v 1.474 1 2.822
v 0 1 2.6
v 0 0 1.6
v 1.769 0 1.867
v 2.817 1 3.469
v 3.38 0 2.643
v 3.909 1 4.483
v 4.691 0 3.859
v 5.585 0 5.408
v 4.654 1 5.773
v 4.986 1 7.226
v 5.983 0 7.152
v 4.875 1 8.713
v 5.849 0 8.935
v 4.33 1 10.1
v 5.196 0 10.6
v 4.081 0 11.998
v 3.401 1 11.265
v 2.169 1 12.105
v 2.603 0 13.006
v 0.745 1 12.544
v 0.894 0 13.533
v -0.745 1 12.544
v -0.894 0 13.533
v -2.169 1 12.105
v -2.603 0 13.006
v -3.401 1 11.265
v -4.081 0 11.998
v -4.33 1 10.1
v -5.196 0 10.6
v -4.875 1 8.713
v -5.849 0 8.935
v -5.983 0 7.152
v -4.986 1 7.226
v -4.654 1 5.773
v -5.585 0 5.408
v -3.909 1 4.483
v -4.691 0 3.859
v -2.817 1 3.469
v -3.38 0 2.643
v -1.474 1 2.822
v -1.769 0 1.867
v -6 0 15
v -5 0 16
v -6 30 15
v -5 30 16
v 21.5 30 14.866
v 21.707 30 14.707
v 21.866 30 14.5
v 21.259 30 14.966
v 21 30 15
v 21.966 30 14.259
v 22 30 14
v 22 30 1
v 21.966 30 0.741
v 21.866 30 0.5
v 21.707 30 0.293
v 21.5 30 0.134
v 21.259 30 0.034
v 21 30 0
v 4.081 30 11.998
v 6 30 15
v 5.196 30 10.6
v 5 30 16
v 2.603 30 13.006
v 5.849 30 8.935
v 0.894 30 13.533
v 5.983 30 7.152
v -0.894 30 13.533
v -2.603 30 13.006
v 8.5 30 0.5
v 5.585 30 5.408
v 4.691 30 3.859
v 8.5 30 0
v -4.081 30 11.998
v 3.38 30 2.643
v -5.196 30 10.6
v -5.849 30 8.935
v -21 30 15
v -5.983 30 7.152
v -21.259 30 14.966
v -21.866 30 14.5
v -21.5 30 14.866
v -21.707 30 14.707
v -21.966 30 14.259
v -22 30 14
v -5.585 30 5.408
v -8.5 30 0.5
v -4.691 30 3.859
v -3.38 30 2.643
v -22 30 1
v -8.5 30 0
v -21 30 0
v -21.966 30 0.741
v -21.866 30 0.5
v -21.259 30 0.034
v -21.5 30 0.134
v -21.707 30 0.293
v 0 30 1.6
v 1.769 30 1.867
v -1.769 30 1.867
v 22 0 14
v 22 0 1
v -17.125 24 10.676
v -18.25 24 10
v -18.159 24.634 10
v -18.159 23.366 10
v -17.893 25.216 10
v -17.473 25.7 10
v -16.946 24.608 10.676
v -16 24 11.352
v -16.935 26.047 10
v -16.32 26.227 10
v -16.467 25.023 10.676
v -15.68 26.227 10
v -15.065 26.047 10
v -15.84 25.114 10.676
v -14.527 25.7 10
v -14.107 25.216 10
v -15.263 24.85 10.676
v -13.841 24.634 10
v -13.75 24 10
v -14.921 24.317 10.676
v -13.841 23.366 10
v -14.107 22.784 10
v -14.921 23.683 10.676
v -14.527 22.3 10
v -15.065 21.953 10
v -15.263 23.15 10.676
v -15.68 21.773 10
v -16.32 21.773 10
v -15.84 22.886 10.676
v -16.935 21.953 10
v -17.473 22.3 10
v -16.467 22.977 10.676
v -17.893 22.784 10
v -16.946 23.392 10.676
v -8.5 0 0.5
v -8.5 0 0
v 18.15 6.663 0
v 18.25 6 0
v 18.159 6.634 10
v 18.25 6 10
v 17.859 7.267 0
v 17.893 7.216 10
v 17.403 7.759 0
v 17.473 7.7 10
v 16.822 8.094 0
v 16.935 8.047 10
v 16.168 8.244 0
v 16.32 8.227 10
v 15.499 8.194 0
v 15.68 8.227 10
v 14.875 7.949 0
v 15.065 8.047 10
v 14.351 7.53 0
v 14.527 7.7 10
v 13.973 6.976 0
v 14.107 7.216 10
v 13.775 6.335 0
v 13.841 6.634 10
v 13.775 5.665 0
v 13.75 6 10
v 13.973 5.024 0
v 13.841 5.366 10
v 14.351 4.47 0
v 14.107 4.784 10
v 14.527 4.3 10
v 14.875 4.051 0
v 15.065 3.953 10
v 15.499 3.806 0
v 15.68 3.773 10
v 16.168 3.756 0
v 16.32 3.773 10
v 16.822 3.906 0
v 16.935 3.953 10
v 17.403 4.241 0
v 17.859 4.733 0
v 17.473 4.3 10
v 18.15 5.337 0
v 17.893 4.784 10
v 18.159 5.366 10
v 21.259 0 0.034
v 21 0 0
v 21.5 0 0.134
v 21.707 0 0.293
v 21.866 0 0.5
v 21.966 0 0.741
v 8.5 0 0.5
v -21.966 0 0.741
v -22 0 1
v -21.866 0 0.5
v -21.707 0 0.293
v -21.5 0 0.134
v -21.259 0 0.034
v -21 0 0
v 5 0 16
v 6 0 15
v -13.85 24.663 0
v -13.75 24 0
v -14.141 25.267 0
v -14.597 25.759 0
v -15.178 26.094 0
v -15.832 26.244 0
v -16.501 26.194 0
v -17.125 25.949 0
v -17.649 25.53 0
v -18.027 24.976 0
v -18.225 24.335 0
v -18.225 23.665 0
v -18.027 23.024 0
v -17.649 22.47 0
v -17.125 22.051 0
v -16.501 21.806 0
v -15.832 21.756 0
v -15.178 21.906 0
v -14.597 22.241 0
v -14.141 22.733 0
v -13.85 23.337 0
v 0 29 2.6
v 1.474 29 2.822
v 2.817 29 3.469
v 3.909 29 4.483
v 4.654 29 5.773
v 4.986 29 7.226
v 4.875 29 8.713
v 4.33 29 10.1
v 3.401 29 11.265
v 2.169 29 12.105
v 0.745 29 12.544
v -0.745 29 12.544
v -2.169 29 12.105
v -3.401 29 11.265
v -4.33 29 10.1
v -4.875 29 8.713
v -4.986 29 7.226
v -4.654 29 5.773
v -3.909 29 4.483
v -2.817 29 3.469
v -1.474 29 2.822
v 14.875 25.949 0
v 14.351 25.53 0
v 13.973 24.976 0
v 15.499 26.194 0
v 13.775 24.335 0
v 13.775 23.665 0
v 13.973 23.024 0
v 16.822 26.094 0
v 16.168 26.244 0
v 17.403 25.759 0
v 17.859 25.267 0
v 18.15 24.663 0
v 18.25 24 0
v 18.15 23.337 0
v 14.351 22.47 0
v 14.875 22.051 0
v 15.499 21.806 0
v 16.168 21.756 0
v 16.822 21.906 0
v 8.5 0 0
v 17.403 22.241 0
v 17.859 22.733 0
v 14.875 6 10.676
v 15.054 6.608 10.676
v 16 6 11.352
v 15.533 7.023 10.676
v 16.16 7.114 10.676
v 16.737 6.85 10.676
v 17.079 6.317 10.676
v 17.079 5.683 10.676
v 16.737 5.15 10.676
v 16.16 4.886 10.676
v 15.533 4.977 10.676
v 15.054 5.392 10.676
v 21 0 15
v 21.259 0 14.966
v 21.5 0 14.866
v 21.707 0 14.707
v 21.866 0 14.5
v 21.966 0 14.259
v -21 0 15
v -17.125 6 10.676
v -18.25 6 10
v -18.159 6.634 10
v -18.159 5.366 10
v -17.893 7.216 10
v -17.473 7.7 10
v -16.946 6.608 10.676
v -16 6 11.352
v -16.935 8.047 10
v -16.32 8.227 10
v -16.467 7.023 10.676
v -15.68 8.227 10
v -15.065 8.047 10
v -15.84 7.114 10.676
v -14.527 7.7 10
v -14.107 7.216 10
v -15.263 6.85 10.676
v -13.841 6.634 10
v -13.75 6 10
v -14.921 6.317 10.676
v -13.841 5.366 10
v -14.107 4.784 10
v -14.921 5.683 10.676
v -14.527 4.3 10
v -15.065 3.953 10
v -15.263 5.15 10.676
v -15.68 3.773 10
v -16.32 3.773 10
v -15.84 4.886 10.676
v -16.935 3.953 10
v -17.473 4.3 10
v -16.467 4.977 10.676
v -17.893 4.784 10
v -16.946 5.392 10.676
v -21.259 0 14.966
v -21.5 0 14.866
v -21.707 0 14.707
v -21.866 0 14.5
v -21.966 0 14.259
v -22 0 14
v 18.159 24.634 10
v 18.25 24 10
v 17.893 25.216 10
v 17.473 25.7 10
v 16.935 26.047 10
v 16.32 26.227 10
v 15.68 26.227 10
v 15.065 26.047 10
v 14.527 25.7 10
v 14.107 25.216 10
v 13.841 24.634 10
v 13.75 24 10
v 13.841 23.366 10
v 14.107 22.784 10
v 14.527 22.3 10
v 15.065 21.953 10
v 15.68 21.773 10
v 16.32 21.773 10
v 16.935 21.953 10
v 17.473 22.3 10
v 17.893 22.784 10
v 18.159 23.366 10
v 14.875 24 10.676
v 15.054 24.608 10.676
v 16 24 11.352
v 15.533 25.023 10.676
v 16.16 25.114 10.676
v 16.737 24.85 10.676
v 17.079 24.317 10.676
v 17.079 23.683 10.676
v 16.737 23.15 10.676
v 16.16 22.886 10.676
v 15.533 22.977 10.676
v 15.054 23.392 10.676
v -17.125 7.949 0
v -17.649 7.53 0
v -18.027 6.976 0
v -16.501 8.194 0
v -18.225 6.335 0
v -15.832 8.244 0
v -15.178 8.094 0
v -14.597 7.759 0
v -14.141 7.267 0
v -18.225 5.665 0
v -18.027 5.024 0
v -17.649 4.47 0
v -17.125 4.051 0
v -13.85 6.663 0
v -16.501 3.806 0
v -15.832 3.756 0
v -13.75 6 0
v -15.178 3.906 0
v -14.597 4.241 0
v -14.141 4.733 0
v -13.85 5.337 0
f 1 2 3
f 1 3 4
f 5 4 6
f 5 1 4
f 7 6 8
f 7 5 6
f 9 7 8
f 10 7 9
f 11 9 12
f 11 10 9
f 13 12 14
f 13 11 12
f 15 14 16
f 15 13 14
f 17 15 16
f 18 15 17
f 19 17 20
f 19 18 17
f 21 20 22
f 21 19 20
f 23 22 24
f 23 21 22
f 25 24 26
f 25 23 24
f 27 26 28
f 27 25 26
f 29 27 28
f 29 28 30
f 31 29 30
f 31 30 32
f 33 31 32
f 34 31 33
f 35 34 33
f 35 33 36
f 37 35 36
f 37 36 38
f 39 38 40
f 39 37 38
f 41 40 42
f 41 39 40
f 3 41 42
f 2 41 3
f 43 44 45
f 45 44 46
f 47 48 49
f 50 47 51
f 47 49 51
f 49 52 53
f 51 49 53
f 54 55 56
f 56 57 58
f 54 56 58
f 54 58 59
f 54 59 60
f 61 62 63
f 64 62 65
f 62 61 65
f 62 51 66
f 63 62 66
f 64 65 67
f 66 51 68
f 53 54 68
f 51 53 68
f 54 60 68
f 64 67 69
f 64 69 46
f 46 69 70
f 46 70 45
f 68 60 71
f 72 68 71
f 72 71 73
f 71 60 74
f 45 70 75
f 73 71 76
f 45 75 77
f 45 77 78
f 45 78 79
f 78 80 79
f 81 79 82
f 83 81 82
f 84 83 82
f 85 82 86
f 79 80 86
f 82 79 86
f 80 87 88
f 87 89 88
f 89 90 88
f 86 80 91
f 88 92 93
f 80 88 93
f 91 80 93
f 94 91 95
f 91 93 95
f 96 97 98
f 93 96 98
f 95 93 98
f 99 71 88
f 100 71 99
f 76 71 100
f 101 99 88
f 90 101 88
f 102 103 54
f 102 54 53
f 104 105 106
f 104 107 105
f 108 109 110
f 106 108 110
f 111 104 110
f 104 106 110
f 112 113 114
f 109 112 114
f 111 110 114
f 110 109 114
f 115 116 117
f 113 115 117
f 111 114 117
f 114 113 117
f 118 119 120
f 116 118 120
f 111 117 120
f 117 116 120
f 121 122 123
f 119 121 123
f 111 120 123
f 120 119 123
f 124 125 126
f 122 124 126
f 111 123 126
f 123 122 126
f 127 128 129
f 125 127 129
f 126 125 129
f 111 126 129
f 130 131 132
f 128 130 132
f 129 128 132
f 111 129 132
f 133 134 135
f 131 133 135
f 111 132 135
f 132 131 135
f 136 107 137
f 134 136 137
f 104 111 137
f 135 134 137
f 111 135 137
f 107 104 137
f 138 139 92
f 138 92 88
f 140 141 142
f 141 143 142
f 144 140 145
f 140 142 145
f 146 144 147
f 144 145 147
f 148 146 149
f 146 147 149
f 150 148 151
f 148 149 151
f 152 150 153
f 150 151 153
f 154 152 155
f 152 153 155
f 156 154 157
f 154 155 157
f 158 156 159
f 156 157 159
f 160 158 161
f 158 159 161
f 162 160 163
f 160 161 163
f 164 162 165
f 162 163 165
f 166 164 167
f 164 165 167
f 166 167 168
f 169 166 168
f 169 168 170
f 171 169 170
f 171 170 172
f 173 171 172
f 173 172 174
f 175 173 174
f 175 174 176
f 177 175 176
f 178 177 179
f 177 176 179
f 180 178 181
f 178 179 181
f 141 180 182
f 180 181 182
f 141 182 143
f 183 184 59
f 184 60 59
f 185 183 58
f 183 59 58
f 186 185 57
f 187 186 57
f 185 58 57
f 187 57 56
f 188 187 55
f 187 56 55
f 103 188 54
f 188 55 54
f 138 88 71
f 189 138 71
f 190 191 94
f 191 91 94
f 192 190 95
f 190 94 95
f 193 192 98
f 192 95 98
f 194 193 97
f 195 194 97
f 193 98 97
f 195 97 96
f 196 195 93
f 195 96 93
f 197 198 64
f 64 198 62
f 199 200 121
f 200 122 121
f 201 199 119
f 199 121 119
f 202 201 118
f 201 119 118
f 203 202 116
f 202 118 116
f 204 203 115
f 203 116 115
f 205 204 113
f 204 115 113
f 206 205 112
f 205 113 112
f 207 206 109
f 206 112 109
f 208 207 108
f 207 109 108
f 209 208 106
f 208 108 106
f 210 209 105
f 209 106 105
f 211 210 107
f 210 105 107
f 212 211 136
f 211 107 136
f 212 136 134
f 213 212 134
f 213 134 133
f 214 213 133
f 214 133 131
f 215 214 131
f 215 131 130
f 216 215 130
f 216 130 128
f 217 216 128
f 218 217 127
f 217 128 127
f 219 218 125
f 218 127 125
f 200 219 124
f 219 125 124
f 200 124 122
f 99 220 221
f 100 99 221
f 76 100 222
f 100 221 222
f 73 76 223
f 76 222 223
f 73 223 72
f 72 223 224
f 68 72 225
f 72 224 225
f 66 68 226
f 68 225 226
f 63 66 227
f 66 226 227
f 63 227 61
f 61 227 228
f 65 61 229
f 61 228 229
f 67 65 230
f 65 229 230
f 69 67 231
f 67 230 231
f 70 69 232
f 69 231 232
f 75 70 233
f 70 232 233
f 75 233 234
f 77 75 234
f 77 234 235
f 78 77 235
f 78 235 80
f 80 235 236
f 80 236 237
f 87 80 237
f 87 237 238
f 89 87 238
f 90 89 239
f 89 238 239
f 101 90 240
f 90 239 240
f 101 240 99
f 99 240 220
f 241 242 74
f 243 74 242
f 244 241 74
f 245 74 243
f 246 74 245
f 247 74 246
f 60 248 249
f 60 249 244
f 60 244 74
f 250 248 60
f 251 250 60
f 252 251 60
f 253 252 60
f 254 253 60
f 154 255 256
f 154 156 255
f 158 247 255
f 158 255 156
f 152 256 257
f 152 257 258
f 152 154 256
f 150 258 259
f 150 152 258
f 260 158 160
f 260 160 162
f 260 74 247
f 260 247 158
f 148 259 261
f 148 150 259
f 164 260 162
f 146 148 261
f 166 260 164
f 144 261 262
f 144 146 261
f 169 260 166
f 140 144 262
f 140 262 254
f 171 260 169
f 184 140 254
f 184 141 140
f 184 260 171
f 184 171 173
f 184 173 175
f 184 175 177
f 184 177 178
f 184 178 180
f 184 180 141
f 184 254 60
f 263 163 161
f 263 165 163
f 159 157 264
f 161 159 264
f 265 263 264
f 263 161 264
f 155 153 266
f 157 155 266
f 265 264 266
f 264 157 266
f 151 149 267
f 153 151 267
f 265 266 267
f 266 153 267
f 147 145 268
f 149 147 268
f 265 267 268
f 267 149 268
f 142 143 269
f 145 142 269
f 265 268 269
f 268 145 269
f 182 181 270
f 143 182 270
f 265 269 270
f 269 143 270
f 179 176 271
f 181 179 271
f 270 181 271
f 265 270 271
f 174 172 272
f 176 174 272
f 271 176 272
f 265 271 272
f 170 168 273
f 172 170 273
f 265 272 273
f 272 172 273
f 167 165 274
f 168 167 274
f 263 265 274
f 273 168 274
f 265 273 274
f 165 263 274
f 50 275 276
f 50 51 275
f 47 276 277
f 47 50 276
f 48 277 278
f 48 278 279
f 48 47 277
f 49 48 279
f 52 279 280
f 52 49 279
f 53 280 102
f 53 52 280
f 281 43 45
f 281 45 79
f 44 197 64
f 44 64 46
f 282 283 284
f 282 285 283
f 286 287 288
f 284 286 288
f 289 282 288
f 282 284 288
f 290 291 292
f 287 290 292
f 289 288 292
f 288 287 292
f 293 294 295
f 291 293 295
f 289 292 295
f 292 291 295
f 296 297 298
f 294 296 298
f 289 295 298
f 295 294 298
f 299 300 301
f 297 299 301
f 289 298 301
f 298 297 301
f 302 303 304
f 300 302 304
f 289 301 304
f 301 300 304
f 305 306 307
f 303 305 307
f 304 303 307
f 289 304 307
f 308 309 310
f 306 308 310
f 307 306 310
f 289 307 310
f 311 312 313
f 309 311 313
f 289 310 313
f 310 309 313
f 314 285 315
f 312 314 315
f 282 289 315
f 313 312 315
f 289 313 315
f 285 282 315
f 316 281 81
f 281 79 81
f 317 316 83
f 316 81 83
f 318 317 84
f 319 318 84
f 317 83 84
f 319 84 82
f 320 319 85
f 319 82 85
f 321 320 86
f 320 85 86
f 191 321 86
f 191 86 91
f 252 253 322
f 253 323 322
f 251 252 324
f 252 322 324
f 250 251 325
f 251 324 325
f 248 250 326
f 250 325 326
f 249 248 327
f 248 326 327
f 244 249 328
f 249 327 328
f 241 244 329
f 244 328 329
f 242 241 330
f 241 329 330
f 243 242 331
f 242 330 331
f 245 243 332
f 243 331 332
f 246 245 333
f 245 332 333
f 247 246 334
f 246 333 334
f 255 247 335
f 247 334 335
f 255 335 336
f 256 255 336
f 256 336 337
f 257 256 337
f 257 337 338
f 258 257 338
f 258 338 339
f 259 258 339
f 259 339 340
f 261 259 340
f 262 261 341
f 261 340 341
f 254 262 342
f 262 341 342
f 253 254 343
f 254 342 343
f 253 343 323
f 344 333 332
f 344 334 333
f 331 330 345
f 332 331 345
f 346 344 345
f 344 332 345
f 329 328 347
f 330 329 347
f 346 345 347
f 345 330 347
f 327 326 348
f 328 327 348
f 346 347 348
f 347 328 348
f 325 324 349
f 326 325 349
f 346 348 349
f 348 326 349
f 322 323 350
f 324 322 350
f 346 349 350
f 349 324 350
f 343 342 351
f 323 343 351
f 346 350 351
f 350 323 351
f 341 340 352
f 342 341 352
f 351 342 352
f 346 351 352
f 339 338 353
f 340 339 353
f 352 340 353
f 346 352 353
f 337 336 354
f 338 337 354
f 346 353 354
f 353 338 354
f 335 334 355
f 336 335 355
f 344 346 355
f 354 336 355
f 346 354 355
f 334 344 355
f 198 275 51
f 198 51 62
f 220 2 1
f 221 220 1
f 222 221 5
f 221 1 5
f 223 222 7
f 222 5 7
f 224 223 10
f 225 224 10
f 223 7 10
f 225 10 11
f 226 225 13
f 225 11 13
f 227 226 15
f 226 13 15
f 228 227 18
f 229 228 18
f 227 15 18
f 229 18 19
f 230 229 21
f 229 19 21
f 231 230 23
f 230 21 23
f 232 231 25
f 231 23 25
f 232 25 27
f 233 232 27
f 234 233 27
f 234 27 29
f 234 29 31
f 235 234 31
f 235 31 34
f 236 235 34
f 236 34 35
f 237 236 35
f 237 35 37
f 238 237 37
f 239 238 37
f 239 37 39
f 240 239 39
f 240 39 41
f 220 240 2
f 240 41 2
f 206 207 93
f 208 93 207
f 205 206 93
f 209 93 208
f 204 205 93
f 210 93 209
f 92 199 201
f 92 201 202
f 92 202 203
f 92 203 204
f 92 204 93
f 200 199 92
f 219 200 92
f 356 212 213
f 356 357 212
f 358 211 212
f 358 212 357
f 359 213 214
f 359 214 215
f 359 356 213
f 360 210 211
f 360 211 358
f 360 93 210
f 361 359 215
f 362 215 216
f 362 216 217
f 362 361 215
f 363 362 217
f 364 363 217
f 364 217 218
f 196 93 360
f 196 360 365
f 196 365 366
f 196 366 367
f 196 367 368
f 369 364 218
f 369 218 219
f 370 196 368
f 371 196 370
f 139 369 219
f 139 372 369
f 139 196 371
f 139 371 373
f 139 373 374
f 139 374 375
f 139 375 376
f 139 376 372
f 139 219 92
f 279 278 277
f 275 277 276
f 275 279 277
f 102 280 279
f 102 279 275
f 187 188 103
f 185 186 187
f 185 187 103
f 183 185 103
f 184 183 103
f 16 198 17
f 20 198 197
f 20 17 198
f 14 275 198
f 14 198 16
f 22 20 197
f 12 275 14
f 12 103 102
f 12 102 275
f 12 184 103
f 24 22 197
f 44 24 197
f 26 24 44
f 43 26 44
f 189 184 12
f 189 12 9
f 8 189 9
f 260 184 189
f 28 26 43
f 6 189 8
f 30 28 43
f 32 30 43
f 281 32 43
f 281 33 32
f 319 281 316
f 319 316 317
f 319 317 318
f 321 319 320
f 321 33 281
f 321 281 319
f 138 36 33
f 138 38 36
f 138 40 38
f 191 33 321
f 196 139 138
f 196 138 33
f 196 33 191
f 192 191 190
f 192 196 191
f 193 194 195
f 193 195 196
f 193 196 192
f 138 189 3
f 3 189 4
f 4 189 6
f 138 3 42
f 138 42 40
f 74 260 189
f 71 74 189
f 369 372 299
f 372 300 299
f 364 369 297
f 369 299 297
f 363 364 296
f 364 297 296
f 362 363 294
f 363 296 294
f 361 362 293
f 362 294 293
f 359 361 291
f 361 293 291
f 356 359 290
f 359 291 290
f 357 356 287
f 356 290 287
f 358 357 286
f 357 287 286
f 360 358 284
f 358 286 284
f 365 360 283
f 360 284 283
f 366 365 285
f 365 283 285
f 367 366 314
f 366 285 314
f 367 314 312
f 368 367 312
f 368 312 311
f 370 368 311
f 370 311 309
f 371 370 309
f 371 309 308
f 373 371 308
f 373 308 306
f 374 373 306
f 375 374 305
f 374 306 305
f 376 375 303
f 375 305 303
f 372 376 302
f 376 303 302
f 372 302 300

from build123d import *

# Parameters (mm, degrees)
EXTRUDE_1_DEPTH     = 30
SKETCH_2_R          = 5
CUT_EXTRUDE_1_DEPTH = 30
M5X0_5_1_D          = 4.5
M5X0_5_1_DEPTH      = 10
M5X0_5_1_TIP        = 1.351936393
SKETCH_7_W          = 17
SKETCH_7_H          = 0.5
CUT_EXTRUDE_2_DEPTH = 41.496913463
CHAMFER_1_SIZE      = 1
FILLET_1_R          = 1


with BuildPart() as part:
    # 草图1 → 凸台-拉伸1 (new body)
    with BuildSketch(Plane(origin=(0, 0, 0), x_dir=(1, 0, 0), z_dir=(0, 1, 0))):
        Polygon((-22, 0), (22, 0), (22, -15), (5, -15), (5, -16), (-5, -16), (-5, -15), (-22, -15), align=None)
    extrude(amount=EXTRUDE_1_DEPTH)

    # 草图2 → 切除-拉伸1 (cut)
    with BuildSketch(Plane.XZ):
        with Locations(Location((0, 7.6, 0), (0, 0, 270))):
            Circle(SKETCH_2_R)
    extrude(amount=-CUT_EXTRUDE_1_DEPTH, mode=Mode.SUBTRACT)

    # M5X0.5 螺纹孔的螺纹孔钻头1
    with Locations(Plane(origin=(0, 0, 0), x_dir=(-1, 0, 0), z_dir=(0, 0, -1))):
        with Locations((-16, 24), (16, 24), (16, 6), (-16, 6)):
            Hole(M5X0_5_1_D / 2, depth=M5X0_5_1_DEPTH)
            with Locations((0, 0, -(M5X0_5_1_DEPTH + M5X0_5_1_TIP / 2))):  # 118° drill point
                Cone(0, M5X0_5_1_D / 2, M5X0_5_1_TIP, mode=Mode.SUBTRACT)

    # 草图7 → 切除-拉伸2 (cut, through all)
    with BuildSketch(Plane.XZ):
        with Locations((0, 0.25)):
            Rectangle(SKETCH_7_W, SKETCH_7_H)
    extrude(amount=-CUT_EXTRUDE_2_DEPTH, mode=Mode.SUBTRACT)

    # 倒角1
    chamfer_1_edges = [part.edges().sort_by_distance(p)[0] for p in [
        (-5, 15, 15),
        (5, 15, 15),
        (0, 30, 12.6),
        (0, 0, 12.6),
    ]]
    chamfer(chamfer_1_edges, length=CHAMFER_1_SIZE - 0.0001)  # a hair under: the kernel refuses the full size

    # 圆角1
    fillet_1_edges = [part.edges().sort_by_distance(p)[0] for p in [
        (-22, 15, 15),
        (-22, 15, 0),
        (22, 15, 0),
        (22, 15, 15),
    ]]
    fillet(fillet_1_edges, radius=FILLET_1_R)


solid = part.part
